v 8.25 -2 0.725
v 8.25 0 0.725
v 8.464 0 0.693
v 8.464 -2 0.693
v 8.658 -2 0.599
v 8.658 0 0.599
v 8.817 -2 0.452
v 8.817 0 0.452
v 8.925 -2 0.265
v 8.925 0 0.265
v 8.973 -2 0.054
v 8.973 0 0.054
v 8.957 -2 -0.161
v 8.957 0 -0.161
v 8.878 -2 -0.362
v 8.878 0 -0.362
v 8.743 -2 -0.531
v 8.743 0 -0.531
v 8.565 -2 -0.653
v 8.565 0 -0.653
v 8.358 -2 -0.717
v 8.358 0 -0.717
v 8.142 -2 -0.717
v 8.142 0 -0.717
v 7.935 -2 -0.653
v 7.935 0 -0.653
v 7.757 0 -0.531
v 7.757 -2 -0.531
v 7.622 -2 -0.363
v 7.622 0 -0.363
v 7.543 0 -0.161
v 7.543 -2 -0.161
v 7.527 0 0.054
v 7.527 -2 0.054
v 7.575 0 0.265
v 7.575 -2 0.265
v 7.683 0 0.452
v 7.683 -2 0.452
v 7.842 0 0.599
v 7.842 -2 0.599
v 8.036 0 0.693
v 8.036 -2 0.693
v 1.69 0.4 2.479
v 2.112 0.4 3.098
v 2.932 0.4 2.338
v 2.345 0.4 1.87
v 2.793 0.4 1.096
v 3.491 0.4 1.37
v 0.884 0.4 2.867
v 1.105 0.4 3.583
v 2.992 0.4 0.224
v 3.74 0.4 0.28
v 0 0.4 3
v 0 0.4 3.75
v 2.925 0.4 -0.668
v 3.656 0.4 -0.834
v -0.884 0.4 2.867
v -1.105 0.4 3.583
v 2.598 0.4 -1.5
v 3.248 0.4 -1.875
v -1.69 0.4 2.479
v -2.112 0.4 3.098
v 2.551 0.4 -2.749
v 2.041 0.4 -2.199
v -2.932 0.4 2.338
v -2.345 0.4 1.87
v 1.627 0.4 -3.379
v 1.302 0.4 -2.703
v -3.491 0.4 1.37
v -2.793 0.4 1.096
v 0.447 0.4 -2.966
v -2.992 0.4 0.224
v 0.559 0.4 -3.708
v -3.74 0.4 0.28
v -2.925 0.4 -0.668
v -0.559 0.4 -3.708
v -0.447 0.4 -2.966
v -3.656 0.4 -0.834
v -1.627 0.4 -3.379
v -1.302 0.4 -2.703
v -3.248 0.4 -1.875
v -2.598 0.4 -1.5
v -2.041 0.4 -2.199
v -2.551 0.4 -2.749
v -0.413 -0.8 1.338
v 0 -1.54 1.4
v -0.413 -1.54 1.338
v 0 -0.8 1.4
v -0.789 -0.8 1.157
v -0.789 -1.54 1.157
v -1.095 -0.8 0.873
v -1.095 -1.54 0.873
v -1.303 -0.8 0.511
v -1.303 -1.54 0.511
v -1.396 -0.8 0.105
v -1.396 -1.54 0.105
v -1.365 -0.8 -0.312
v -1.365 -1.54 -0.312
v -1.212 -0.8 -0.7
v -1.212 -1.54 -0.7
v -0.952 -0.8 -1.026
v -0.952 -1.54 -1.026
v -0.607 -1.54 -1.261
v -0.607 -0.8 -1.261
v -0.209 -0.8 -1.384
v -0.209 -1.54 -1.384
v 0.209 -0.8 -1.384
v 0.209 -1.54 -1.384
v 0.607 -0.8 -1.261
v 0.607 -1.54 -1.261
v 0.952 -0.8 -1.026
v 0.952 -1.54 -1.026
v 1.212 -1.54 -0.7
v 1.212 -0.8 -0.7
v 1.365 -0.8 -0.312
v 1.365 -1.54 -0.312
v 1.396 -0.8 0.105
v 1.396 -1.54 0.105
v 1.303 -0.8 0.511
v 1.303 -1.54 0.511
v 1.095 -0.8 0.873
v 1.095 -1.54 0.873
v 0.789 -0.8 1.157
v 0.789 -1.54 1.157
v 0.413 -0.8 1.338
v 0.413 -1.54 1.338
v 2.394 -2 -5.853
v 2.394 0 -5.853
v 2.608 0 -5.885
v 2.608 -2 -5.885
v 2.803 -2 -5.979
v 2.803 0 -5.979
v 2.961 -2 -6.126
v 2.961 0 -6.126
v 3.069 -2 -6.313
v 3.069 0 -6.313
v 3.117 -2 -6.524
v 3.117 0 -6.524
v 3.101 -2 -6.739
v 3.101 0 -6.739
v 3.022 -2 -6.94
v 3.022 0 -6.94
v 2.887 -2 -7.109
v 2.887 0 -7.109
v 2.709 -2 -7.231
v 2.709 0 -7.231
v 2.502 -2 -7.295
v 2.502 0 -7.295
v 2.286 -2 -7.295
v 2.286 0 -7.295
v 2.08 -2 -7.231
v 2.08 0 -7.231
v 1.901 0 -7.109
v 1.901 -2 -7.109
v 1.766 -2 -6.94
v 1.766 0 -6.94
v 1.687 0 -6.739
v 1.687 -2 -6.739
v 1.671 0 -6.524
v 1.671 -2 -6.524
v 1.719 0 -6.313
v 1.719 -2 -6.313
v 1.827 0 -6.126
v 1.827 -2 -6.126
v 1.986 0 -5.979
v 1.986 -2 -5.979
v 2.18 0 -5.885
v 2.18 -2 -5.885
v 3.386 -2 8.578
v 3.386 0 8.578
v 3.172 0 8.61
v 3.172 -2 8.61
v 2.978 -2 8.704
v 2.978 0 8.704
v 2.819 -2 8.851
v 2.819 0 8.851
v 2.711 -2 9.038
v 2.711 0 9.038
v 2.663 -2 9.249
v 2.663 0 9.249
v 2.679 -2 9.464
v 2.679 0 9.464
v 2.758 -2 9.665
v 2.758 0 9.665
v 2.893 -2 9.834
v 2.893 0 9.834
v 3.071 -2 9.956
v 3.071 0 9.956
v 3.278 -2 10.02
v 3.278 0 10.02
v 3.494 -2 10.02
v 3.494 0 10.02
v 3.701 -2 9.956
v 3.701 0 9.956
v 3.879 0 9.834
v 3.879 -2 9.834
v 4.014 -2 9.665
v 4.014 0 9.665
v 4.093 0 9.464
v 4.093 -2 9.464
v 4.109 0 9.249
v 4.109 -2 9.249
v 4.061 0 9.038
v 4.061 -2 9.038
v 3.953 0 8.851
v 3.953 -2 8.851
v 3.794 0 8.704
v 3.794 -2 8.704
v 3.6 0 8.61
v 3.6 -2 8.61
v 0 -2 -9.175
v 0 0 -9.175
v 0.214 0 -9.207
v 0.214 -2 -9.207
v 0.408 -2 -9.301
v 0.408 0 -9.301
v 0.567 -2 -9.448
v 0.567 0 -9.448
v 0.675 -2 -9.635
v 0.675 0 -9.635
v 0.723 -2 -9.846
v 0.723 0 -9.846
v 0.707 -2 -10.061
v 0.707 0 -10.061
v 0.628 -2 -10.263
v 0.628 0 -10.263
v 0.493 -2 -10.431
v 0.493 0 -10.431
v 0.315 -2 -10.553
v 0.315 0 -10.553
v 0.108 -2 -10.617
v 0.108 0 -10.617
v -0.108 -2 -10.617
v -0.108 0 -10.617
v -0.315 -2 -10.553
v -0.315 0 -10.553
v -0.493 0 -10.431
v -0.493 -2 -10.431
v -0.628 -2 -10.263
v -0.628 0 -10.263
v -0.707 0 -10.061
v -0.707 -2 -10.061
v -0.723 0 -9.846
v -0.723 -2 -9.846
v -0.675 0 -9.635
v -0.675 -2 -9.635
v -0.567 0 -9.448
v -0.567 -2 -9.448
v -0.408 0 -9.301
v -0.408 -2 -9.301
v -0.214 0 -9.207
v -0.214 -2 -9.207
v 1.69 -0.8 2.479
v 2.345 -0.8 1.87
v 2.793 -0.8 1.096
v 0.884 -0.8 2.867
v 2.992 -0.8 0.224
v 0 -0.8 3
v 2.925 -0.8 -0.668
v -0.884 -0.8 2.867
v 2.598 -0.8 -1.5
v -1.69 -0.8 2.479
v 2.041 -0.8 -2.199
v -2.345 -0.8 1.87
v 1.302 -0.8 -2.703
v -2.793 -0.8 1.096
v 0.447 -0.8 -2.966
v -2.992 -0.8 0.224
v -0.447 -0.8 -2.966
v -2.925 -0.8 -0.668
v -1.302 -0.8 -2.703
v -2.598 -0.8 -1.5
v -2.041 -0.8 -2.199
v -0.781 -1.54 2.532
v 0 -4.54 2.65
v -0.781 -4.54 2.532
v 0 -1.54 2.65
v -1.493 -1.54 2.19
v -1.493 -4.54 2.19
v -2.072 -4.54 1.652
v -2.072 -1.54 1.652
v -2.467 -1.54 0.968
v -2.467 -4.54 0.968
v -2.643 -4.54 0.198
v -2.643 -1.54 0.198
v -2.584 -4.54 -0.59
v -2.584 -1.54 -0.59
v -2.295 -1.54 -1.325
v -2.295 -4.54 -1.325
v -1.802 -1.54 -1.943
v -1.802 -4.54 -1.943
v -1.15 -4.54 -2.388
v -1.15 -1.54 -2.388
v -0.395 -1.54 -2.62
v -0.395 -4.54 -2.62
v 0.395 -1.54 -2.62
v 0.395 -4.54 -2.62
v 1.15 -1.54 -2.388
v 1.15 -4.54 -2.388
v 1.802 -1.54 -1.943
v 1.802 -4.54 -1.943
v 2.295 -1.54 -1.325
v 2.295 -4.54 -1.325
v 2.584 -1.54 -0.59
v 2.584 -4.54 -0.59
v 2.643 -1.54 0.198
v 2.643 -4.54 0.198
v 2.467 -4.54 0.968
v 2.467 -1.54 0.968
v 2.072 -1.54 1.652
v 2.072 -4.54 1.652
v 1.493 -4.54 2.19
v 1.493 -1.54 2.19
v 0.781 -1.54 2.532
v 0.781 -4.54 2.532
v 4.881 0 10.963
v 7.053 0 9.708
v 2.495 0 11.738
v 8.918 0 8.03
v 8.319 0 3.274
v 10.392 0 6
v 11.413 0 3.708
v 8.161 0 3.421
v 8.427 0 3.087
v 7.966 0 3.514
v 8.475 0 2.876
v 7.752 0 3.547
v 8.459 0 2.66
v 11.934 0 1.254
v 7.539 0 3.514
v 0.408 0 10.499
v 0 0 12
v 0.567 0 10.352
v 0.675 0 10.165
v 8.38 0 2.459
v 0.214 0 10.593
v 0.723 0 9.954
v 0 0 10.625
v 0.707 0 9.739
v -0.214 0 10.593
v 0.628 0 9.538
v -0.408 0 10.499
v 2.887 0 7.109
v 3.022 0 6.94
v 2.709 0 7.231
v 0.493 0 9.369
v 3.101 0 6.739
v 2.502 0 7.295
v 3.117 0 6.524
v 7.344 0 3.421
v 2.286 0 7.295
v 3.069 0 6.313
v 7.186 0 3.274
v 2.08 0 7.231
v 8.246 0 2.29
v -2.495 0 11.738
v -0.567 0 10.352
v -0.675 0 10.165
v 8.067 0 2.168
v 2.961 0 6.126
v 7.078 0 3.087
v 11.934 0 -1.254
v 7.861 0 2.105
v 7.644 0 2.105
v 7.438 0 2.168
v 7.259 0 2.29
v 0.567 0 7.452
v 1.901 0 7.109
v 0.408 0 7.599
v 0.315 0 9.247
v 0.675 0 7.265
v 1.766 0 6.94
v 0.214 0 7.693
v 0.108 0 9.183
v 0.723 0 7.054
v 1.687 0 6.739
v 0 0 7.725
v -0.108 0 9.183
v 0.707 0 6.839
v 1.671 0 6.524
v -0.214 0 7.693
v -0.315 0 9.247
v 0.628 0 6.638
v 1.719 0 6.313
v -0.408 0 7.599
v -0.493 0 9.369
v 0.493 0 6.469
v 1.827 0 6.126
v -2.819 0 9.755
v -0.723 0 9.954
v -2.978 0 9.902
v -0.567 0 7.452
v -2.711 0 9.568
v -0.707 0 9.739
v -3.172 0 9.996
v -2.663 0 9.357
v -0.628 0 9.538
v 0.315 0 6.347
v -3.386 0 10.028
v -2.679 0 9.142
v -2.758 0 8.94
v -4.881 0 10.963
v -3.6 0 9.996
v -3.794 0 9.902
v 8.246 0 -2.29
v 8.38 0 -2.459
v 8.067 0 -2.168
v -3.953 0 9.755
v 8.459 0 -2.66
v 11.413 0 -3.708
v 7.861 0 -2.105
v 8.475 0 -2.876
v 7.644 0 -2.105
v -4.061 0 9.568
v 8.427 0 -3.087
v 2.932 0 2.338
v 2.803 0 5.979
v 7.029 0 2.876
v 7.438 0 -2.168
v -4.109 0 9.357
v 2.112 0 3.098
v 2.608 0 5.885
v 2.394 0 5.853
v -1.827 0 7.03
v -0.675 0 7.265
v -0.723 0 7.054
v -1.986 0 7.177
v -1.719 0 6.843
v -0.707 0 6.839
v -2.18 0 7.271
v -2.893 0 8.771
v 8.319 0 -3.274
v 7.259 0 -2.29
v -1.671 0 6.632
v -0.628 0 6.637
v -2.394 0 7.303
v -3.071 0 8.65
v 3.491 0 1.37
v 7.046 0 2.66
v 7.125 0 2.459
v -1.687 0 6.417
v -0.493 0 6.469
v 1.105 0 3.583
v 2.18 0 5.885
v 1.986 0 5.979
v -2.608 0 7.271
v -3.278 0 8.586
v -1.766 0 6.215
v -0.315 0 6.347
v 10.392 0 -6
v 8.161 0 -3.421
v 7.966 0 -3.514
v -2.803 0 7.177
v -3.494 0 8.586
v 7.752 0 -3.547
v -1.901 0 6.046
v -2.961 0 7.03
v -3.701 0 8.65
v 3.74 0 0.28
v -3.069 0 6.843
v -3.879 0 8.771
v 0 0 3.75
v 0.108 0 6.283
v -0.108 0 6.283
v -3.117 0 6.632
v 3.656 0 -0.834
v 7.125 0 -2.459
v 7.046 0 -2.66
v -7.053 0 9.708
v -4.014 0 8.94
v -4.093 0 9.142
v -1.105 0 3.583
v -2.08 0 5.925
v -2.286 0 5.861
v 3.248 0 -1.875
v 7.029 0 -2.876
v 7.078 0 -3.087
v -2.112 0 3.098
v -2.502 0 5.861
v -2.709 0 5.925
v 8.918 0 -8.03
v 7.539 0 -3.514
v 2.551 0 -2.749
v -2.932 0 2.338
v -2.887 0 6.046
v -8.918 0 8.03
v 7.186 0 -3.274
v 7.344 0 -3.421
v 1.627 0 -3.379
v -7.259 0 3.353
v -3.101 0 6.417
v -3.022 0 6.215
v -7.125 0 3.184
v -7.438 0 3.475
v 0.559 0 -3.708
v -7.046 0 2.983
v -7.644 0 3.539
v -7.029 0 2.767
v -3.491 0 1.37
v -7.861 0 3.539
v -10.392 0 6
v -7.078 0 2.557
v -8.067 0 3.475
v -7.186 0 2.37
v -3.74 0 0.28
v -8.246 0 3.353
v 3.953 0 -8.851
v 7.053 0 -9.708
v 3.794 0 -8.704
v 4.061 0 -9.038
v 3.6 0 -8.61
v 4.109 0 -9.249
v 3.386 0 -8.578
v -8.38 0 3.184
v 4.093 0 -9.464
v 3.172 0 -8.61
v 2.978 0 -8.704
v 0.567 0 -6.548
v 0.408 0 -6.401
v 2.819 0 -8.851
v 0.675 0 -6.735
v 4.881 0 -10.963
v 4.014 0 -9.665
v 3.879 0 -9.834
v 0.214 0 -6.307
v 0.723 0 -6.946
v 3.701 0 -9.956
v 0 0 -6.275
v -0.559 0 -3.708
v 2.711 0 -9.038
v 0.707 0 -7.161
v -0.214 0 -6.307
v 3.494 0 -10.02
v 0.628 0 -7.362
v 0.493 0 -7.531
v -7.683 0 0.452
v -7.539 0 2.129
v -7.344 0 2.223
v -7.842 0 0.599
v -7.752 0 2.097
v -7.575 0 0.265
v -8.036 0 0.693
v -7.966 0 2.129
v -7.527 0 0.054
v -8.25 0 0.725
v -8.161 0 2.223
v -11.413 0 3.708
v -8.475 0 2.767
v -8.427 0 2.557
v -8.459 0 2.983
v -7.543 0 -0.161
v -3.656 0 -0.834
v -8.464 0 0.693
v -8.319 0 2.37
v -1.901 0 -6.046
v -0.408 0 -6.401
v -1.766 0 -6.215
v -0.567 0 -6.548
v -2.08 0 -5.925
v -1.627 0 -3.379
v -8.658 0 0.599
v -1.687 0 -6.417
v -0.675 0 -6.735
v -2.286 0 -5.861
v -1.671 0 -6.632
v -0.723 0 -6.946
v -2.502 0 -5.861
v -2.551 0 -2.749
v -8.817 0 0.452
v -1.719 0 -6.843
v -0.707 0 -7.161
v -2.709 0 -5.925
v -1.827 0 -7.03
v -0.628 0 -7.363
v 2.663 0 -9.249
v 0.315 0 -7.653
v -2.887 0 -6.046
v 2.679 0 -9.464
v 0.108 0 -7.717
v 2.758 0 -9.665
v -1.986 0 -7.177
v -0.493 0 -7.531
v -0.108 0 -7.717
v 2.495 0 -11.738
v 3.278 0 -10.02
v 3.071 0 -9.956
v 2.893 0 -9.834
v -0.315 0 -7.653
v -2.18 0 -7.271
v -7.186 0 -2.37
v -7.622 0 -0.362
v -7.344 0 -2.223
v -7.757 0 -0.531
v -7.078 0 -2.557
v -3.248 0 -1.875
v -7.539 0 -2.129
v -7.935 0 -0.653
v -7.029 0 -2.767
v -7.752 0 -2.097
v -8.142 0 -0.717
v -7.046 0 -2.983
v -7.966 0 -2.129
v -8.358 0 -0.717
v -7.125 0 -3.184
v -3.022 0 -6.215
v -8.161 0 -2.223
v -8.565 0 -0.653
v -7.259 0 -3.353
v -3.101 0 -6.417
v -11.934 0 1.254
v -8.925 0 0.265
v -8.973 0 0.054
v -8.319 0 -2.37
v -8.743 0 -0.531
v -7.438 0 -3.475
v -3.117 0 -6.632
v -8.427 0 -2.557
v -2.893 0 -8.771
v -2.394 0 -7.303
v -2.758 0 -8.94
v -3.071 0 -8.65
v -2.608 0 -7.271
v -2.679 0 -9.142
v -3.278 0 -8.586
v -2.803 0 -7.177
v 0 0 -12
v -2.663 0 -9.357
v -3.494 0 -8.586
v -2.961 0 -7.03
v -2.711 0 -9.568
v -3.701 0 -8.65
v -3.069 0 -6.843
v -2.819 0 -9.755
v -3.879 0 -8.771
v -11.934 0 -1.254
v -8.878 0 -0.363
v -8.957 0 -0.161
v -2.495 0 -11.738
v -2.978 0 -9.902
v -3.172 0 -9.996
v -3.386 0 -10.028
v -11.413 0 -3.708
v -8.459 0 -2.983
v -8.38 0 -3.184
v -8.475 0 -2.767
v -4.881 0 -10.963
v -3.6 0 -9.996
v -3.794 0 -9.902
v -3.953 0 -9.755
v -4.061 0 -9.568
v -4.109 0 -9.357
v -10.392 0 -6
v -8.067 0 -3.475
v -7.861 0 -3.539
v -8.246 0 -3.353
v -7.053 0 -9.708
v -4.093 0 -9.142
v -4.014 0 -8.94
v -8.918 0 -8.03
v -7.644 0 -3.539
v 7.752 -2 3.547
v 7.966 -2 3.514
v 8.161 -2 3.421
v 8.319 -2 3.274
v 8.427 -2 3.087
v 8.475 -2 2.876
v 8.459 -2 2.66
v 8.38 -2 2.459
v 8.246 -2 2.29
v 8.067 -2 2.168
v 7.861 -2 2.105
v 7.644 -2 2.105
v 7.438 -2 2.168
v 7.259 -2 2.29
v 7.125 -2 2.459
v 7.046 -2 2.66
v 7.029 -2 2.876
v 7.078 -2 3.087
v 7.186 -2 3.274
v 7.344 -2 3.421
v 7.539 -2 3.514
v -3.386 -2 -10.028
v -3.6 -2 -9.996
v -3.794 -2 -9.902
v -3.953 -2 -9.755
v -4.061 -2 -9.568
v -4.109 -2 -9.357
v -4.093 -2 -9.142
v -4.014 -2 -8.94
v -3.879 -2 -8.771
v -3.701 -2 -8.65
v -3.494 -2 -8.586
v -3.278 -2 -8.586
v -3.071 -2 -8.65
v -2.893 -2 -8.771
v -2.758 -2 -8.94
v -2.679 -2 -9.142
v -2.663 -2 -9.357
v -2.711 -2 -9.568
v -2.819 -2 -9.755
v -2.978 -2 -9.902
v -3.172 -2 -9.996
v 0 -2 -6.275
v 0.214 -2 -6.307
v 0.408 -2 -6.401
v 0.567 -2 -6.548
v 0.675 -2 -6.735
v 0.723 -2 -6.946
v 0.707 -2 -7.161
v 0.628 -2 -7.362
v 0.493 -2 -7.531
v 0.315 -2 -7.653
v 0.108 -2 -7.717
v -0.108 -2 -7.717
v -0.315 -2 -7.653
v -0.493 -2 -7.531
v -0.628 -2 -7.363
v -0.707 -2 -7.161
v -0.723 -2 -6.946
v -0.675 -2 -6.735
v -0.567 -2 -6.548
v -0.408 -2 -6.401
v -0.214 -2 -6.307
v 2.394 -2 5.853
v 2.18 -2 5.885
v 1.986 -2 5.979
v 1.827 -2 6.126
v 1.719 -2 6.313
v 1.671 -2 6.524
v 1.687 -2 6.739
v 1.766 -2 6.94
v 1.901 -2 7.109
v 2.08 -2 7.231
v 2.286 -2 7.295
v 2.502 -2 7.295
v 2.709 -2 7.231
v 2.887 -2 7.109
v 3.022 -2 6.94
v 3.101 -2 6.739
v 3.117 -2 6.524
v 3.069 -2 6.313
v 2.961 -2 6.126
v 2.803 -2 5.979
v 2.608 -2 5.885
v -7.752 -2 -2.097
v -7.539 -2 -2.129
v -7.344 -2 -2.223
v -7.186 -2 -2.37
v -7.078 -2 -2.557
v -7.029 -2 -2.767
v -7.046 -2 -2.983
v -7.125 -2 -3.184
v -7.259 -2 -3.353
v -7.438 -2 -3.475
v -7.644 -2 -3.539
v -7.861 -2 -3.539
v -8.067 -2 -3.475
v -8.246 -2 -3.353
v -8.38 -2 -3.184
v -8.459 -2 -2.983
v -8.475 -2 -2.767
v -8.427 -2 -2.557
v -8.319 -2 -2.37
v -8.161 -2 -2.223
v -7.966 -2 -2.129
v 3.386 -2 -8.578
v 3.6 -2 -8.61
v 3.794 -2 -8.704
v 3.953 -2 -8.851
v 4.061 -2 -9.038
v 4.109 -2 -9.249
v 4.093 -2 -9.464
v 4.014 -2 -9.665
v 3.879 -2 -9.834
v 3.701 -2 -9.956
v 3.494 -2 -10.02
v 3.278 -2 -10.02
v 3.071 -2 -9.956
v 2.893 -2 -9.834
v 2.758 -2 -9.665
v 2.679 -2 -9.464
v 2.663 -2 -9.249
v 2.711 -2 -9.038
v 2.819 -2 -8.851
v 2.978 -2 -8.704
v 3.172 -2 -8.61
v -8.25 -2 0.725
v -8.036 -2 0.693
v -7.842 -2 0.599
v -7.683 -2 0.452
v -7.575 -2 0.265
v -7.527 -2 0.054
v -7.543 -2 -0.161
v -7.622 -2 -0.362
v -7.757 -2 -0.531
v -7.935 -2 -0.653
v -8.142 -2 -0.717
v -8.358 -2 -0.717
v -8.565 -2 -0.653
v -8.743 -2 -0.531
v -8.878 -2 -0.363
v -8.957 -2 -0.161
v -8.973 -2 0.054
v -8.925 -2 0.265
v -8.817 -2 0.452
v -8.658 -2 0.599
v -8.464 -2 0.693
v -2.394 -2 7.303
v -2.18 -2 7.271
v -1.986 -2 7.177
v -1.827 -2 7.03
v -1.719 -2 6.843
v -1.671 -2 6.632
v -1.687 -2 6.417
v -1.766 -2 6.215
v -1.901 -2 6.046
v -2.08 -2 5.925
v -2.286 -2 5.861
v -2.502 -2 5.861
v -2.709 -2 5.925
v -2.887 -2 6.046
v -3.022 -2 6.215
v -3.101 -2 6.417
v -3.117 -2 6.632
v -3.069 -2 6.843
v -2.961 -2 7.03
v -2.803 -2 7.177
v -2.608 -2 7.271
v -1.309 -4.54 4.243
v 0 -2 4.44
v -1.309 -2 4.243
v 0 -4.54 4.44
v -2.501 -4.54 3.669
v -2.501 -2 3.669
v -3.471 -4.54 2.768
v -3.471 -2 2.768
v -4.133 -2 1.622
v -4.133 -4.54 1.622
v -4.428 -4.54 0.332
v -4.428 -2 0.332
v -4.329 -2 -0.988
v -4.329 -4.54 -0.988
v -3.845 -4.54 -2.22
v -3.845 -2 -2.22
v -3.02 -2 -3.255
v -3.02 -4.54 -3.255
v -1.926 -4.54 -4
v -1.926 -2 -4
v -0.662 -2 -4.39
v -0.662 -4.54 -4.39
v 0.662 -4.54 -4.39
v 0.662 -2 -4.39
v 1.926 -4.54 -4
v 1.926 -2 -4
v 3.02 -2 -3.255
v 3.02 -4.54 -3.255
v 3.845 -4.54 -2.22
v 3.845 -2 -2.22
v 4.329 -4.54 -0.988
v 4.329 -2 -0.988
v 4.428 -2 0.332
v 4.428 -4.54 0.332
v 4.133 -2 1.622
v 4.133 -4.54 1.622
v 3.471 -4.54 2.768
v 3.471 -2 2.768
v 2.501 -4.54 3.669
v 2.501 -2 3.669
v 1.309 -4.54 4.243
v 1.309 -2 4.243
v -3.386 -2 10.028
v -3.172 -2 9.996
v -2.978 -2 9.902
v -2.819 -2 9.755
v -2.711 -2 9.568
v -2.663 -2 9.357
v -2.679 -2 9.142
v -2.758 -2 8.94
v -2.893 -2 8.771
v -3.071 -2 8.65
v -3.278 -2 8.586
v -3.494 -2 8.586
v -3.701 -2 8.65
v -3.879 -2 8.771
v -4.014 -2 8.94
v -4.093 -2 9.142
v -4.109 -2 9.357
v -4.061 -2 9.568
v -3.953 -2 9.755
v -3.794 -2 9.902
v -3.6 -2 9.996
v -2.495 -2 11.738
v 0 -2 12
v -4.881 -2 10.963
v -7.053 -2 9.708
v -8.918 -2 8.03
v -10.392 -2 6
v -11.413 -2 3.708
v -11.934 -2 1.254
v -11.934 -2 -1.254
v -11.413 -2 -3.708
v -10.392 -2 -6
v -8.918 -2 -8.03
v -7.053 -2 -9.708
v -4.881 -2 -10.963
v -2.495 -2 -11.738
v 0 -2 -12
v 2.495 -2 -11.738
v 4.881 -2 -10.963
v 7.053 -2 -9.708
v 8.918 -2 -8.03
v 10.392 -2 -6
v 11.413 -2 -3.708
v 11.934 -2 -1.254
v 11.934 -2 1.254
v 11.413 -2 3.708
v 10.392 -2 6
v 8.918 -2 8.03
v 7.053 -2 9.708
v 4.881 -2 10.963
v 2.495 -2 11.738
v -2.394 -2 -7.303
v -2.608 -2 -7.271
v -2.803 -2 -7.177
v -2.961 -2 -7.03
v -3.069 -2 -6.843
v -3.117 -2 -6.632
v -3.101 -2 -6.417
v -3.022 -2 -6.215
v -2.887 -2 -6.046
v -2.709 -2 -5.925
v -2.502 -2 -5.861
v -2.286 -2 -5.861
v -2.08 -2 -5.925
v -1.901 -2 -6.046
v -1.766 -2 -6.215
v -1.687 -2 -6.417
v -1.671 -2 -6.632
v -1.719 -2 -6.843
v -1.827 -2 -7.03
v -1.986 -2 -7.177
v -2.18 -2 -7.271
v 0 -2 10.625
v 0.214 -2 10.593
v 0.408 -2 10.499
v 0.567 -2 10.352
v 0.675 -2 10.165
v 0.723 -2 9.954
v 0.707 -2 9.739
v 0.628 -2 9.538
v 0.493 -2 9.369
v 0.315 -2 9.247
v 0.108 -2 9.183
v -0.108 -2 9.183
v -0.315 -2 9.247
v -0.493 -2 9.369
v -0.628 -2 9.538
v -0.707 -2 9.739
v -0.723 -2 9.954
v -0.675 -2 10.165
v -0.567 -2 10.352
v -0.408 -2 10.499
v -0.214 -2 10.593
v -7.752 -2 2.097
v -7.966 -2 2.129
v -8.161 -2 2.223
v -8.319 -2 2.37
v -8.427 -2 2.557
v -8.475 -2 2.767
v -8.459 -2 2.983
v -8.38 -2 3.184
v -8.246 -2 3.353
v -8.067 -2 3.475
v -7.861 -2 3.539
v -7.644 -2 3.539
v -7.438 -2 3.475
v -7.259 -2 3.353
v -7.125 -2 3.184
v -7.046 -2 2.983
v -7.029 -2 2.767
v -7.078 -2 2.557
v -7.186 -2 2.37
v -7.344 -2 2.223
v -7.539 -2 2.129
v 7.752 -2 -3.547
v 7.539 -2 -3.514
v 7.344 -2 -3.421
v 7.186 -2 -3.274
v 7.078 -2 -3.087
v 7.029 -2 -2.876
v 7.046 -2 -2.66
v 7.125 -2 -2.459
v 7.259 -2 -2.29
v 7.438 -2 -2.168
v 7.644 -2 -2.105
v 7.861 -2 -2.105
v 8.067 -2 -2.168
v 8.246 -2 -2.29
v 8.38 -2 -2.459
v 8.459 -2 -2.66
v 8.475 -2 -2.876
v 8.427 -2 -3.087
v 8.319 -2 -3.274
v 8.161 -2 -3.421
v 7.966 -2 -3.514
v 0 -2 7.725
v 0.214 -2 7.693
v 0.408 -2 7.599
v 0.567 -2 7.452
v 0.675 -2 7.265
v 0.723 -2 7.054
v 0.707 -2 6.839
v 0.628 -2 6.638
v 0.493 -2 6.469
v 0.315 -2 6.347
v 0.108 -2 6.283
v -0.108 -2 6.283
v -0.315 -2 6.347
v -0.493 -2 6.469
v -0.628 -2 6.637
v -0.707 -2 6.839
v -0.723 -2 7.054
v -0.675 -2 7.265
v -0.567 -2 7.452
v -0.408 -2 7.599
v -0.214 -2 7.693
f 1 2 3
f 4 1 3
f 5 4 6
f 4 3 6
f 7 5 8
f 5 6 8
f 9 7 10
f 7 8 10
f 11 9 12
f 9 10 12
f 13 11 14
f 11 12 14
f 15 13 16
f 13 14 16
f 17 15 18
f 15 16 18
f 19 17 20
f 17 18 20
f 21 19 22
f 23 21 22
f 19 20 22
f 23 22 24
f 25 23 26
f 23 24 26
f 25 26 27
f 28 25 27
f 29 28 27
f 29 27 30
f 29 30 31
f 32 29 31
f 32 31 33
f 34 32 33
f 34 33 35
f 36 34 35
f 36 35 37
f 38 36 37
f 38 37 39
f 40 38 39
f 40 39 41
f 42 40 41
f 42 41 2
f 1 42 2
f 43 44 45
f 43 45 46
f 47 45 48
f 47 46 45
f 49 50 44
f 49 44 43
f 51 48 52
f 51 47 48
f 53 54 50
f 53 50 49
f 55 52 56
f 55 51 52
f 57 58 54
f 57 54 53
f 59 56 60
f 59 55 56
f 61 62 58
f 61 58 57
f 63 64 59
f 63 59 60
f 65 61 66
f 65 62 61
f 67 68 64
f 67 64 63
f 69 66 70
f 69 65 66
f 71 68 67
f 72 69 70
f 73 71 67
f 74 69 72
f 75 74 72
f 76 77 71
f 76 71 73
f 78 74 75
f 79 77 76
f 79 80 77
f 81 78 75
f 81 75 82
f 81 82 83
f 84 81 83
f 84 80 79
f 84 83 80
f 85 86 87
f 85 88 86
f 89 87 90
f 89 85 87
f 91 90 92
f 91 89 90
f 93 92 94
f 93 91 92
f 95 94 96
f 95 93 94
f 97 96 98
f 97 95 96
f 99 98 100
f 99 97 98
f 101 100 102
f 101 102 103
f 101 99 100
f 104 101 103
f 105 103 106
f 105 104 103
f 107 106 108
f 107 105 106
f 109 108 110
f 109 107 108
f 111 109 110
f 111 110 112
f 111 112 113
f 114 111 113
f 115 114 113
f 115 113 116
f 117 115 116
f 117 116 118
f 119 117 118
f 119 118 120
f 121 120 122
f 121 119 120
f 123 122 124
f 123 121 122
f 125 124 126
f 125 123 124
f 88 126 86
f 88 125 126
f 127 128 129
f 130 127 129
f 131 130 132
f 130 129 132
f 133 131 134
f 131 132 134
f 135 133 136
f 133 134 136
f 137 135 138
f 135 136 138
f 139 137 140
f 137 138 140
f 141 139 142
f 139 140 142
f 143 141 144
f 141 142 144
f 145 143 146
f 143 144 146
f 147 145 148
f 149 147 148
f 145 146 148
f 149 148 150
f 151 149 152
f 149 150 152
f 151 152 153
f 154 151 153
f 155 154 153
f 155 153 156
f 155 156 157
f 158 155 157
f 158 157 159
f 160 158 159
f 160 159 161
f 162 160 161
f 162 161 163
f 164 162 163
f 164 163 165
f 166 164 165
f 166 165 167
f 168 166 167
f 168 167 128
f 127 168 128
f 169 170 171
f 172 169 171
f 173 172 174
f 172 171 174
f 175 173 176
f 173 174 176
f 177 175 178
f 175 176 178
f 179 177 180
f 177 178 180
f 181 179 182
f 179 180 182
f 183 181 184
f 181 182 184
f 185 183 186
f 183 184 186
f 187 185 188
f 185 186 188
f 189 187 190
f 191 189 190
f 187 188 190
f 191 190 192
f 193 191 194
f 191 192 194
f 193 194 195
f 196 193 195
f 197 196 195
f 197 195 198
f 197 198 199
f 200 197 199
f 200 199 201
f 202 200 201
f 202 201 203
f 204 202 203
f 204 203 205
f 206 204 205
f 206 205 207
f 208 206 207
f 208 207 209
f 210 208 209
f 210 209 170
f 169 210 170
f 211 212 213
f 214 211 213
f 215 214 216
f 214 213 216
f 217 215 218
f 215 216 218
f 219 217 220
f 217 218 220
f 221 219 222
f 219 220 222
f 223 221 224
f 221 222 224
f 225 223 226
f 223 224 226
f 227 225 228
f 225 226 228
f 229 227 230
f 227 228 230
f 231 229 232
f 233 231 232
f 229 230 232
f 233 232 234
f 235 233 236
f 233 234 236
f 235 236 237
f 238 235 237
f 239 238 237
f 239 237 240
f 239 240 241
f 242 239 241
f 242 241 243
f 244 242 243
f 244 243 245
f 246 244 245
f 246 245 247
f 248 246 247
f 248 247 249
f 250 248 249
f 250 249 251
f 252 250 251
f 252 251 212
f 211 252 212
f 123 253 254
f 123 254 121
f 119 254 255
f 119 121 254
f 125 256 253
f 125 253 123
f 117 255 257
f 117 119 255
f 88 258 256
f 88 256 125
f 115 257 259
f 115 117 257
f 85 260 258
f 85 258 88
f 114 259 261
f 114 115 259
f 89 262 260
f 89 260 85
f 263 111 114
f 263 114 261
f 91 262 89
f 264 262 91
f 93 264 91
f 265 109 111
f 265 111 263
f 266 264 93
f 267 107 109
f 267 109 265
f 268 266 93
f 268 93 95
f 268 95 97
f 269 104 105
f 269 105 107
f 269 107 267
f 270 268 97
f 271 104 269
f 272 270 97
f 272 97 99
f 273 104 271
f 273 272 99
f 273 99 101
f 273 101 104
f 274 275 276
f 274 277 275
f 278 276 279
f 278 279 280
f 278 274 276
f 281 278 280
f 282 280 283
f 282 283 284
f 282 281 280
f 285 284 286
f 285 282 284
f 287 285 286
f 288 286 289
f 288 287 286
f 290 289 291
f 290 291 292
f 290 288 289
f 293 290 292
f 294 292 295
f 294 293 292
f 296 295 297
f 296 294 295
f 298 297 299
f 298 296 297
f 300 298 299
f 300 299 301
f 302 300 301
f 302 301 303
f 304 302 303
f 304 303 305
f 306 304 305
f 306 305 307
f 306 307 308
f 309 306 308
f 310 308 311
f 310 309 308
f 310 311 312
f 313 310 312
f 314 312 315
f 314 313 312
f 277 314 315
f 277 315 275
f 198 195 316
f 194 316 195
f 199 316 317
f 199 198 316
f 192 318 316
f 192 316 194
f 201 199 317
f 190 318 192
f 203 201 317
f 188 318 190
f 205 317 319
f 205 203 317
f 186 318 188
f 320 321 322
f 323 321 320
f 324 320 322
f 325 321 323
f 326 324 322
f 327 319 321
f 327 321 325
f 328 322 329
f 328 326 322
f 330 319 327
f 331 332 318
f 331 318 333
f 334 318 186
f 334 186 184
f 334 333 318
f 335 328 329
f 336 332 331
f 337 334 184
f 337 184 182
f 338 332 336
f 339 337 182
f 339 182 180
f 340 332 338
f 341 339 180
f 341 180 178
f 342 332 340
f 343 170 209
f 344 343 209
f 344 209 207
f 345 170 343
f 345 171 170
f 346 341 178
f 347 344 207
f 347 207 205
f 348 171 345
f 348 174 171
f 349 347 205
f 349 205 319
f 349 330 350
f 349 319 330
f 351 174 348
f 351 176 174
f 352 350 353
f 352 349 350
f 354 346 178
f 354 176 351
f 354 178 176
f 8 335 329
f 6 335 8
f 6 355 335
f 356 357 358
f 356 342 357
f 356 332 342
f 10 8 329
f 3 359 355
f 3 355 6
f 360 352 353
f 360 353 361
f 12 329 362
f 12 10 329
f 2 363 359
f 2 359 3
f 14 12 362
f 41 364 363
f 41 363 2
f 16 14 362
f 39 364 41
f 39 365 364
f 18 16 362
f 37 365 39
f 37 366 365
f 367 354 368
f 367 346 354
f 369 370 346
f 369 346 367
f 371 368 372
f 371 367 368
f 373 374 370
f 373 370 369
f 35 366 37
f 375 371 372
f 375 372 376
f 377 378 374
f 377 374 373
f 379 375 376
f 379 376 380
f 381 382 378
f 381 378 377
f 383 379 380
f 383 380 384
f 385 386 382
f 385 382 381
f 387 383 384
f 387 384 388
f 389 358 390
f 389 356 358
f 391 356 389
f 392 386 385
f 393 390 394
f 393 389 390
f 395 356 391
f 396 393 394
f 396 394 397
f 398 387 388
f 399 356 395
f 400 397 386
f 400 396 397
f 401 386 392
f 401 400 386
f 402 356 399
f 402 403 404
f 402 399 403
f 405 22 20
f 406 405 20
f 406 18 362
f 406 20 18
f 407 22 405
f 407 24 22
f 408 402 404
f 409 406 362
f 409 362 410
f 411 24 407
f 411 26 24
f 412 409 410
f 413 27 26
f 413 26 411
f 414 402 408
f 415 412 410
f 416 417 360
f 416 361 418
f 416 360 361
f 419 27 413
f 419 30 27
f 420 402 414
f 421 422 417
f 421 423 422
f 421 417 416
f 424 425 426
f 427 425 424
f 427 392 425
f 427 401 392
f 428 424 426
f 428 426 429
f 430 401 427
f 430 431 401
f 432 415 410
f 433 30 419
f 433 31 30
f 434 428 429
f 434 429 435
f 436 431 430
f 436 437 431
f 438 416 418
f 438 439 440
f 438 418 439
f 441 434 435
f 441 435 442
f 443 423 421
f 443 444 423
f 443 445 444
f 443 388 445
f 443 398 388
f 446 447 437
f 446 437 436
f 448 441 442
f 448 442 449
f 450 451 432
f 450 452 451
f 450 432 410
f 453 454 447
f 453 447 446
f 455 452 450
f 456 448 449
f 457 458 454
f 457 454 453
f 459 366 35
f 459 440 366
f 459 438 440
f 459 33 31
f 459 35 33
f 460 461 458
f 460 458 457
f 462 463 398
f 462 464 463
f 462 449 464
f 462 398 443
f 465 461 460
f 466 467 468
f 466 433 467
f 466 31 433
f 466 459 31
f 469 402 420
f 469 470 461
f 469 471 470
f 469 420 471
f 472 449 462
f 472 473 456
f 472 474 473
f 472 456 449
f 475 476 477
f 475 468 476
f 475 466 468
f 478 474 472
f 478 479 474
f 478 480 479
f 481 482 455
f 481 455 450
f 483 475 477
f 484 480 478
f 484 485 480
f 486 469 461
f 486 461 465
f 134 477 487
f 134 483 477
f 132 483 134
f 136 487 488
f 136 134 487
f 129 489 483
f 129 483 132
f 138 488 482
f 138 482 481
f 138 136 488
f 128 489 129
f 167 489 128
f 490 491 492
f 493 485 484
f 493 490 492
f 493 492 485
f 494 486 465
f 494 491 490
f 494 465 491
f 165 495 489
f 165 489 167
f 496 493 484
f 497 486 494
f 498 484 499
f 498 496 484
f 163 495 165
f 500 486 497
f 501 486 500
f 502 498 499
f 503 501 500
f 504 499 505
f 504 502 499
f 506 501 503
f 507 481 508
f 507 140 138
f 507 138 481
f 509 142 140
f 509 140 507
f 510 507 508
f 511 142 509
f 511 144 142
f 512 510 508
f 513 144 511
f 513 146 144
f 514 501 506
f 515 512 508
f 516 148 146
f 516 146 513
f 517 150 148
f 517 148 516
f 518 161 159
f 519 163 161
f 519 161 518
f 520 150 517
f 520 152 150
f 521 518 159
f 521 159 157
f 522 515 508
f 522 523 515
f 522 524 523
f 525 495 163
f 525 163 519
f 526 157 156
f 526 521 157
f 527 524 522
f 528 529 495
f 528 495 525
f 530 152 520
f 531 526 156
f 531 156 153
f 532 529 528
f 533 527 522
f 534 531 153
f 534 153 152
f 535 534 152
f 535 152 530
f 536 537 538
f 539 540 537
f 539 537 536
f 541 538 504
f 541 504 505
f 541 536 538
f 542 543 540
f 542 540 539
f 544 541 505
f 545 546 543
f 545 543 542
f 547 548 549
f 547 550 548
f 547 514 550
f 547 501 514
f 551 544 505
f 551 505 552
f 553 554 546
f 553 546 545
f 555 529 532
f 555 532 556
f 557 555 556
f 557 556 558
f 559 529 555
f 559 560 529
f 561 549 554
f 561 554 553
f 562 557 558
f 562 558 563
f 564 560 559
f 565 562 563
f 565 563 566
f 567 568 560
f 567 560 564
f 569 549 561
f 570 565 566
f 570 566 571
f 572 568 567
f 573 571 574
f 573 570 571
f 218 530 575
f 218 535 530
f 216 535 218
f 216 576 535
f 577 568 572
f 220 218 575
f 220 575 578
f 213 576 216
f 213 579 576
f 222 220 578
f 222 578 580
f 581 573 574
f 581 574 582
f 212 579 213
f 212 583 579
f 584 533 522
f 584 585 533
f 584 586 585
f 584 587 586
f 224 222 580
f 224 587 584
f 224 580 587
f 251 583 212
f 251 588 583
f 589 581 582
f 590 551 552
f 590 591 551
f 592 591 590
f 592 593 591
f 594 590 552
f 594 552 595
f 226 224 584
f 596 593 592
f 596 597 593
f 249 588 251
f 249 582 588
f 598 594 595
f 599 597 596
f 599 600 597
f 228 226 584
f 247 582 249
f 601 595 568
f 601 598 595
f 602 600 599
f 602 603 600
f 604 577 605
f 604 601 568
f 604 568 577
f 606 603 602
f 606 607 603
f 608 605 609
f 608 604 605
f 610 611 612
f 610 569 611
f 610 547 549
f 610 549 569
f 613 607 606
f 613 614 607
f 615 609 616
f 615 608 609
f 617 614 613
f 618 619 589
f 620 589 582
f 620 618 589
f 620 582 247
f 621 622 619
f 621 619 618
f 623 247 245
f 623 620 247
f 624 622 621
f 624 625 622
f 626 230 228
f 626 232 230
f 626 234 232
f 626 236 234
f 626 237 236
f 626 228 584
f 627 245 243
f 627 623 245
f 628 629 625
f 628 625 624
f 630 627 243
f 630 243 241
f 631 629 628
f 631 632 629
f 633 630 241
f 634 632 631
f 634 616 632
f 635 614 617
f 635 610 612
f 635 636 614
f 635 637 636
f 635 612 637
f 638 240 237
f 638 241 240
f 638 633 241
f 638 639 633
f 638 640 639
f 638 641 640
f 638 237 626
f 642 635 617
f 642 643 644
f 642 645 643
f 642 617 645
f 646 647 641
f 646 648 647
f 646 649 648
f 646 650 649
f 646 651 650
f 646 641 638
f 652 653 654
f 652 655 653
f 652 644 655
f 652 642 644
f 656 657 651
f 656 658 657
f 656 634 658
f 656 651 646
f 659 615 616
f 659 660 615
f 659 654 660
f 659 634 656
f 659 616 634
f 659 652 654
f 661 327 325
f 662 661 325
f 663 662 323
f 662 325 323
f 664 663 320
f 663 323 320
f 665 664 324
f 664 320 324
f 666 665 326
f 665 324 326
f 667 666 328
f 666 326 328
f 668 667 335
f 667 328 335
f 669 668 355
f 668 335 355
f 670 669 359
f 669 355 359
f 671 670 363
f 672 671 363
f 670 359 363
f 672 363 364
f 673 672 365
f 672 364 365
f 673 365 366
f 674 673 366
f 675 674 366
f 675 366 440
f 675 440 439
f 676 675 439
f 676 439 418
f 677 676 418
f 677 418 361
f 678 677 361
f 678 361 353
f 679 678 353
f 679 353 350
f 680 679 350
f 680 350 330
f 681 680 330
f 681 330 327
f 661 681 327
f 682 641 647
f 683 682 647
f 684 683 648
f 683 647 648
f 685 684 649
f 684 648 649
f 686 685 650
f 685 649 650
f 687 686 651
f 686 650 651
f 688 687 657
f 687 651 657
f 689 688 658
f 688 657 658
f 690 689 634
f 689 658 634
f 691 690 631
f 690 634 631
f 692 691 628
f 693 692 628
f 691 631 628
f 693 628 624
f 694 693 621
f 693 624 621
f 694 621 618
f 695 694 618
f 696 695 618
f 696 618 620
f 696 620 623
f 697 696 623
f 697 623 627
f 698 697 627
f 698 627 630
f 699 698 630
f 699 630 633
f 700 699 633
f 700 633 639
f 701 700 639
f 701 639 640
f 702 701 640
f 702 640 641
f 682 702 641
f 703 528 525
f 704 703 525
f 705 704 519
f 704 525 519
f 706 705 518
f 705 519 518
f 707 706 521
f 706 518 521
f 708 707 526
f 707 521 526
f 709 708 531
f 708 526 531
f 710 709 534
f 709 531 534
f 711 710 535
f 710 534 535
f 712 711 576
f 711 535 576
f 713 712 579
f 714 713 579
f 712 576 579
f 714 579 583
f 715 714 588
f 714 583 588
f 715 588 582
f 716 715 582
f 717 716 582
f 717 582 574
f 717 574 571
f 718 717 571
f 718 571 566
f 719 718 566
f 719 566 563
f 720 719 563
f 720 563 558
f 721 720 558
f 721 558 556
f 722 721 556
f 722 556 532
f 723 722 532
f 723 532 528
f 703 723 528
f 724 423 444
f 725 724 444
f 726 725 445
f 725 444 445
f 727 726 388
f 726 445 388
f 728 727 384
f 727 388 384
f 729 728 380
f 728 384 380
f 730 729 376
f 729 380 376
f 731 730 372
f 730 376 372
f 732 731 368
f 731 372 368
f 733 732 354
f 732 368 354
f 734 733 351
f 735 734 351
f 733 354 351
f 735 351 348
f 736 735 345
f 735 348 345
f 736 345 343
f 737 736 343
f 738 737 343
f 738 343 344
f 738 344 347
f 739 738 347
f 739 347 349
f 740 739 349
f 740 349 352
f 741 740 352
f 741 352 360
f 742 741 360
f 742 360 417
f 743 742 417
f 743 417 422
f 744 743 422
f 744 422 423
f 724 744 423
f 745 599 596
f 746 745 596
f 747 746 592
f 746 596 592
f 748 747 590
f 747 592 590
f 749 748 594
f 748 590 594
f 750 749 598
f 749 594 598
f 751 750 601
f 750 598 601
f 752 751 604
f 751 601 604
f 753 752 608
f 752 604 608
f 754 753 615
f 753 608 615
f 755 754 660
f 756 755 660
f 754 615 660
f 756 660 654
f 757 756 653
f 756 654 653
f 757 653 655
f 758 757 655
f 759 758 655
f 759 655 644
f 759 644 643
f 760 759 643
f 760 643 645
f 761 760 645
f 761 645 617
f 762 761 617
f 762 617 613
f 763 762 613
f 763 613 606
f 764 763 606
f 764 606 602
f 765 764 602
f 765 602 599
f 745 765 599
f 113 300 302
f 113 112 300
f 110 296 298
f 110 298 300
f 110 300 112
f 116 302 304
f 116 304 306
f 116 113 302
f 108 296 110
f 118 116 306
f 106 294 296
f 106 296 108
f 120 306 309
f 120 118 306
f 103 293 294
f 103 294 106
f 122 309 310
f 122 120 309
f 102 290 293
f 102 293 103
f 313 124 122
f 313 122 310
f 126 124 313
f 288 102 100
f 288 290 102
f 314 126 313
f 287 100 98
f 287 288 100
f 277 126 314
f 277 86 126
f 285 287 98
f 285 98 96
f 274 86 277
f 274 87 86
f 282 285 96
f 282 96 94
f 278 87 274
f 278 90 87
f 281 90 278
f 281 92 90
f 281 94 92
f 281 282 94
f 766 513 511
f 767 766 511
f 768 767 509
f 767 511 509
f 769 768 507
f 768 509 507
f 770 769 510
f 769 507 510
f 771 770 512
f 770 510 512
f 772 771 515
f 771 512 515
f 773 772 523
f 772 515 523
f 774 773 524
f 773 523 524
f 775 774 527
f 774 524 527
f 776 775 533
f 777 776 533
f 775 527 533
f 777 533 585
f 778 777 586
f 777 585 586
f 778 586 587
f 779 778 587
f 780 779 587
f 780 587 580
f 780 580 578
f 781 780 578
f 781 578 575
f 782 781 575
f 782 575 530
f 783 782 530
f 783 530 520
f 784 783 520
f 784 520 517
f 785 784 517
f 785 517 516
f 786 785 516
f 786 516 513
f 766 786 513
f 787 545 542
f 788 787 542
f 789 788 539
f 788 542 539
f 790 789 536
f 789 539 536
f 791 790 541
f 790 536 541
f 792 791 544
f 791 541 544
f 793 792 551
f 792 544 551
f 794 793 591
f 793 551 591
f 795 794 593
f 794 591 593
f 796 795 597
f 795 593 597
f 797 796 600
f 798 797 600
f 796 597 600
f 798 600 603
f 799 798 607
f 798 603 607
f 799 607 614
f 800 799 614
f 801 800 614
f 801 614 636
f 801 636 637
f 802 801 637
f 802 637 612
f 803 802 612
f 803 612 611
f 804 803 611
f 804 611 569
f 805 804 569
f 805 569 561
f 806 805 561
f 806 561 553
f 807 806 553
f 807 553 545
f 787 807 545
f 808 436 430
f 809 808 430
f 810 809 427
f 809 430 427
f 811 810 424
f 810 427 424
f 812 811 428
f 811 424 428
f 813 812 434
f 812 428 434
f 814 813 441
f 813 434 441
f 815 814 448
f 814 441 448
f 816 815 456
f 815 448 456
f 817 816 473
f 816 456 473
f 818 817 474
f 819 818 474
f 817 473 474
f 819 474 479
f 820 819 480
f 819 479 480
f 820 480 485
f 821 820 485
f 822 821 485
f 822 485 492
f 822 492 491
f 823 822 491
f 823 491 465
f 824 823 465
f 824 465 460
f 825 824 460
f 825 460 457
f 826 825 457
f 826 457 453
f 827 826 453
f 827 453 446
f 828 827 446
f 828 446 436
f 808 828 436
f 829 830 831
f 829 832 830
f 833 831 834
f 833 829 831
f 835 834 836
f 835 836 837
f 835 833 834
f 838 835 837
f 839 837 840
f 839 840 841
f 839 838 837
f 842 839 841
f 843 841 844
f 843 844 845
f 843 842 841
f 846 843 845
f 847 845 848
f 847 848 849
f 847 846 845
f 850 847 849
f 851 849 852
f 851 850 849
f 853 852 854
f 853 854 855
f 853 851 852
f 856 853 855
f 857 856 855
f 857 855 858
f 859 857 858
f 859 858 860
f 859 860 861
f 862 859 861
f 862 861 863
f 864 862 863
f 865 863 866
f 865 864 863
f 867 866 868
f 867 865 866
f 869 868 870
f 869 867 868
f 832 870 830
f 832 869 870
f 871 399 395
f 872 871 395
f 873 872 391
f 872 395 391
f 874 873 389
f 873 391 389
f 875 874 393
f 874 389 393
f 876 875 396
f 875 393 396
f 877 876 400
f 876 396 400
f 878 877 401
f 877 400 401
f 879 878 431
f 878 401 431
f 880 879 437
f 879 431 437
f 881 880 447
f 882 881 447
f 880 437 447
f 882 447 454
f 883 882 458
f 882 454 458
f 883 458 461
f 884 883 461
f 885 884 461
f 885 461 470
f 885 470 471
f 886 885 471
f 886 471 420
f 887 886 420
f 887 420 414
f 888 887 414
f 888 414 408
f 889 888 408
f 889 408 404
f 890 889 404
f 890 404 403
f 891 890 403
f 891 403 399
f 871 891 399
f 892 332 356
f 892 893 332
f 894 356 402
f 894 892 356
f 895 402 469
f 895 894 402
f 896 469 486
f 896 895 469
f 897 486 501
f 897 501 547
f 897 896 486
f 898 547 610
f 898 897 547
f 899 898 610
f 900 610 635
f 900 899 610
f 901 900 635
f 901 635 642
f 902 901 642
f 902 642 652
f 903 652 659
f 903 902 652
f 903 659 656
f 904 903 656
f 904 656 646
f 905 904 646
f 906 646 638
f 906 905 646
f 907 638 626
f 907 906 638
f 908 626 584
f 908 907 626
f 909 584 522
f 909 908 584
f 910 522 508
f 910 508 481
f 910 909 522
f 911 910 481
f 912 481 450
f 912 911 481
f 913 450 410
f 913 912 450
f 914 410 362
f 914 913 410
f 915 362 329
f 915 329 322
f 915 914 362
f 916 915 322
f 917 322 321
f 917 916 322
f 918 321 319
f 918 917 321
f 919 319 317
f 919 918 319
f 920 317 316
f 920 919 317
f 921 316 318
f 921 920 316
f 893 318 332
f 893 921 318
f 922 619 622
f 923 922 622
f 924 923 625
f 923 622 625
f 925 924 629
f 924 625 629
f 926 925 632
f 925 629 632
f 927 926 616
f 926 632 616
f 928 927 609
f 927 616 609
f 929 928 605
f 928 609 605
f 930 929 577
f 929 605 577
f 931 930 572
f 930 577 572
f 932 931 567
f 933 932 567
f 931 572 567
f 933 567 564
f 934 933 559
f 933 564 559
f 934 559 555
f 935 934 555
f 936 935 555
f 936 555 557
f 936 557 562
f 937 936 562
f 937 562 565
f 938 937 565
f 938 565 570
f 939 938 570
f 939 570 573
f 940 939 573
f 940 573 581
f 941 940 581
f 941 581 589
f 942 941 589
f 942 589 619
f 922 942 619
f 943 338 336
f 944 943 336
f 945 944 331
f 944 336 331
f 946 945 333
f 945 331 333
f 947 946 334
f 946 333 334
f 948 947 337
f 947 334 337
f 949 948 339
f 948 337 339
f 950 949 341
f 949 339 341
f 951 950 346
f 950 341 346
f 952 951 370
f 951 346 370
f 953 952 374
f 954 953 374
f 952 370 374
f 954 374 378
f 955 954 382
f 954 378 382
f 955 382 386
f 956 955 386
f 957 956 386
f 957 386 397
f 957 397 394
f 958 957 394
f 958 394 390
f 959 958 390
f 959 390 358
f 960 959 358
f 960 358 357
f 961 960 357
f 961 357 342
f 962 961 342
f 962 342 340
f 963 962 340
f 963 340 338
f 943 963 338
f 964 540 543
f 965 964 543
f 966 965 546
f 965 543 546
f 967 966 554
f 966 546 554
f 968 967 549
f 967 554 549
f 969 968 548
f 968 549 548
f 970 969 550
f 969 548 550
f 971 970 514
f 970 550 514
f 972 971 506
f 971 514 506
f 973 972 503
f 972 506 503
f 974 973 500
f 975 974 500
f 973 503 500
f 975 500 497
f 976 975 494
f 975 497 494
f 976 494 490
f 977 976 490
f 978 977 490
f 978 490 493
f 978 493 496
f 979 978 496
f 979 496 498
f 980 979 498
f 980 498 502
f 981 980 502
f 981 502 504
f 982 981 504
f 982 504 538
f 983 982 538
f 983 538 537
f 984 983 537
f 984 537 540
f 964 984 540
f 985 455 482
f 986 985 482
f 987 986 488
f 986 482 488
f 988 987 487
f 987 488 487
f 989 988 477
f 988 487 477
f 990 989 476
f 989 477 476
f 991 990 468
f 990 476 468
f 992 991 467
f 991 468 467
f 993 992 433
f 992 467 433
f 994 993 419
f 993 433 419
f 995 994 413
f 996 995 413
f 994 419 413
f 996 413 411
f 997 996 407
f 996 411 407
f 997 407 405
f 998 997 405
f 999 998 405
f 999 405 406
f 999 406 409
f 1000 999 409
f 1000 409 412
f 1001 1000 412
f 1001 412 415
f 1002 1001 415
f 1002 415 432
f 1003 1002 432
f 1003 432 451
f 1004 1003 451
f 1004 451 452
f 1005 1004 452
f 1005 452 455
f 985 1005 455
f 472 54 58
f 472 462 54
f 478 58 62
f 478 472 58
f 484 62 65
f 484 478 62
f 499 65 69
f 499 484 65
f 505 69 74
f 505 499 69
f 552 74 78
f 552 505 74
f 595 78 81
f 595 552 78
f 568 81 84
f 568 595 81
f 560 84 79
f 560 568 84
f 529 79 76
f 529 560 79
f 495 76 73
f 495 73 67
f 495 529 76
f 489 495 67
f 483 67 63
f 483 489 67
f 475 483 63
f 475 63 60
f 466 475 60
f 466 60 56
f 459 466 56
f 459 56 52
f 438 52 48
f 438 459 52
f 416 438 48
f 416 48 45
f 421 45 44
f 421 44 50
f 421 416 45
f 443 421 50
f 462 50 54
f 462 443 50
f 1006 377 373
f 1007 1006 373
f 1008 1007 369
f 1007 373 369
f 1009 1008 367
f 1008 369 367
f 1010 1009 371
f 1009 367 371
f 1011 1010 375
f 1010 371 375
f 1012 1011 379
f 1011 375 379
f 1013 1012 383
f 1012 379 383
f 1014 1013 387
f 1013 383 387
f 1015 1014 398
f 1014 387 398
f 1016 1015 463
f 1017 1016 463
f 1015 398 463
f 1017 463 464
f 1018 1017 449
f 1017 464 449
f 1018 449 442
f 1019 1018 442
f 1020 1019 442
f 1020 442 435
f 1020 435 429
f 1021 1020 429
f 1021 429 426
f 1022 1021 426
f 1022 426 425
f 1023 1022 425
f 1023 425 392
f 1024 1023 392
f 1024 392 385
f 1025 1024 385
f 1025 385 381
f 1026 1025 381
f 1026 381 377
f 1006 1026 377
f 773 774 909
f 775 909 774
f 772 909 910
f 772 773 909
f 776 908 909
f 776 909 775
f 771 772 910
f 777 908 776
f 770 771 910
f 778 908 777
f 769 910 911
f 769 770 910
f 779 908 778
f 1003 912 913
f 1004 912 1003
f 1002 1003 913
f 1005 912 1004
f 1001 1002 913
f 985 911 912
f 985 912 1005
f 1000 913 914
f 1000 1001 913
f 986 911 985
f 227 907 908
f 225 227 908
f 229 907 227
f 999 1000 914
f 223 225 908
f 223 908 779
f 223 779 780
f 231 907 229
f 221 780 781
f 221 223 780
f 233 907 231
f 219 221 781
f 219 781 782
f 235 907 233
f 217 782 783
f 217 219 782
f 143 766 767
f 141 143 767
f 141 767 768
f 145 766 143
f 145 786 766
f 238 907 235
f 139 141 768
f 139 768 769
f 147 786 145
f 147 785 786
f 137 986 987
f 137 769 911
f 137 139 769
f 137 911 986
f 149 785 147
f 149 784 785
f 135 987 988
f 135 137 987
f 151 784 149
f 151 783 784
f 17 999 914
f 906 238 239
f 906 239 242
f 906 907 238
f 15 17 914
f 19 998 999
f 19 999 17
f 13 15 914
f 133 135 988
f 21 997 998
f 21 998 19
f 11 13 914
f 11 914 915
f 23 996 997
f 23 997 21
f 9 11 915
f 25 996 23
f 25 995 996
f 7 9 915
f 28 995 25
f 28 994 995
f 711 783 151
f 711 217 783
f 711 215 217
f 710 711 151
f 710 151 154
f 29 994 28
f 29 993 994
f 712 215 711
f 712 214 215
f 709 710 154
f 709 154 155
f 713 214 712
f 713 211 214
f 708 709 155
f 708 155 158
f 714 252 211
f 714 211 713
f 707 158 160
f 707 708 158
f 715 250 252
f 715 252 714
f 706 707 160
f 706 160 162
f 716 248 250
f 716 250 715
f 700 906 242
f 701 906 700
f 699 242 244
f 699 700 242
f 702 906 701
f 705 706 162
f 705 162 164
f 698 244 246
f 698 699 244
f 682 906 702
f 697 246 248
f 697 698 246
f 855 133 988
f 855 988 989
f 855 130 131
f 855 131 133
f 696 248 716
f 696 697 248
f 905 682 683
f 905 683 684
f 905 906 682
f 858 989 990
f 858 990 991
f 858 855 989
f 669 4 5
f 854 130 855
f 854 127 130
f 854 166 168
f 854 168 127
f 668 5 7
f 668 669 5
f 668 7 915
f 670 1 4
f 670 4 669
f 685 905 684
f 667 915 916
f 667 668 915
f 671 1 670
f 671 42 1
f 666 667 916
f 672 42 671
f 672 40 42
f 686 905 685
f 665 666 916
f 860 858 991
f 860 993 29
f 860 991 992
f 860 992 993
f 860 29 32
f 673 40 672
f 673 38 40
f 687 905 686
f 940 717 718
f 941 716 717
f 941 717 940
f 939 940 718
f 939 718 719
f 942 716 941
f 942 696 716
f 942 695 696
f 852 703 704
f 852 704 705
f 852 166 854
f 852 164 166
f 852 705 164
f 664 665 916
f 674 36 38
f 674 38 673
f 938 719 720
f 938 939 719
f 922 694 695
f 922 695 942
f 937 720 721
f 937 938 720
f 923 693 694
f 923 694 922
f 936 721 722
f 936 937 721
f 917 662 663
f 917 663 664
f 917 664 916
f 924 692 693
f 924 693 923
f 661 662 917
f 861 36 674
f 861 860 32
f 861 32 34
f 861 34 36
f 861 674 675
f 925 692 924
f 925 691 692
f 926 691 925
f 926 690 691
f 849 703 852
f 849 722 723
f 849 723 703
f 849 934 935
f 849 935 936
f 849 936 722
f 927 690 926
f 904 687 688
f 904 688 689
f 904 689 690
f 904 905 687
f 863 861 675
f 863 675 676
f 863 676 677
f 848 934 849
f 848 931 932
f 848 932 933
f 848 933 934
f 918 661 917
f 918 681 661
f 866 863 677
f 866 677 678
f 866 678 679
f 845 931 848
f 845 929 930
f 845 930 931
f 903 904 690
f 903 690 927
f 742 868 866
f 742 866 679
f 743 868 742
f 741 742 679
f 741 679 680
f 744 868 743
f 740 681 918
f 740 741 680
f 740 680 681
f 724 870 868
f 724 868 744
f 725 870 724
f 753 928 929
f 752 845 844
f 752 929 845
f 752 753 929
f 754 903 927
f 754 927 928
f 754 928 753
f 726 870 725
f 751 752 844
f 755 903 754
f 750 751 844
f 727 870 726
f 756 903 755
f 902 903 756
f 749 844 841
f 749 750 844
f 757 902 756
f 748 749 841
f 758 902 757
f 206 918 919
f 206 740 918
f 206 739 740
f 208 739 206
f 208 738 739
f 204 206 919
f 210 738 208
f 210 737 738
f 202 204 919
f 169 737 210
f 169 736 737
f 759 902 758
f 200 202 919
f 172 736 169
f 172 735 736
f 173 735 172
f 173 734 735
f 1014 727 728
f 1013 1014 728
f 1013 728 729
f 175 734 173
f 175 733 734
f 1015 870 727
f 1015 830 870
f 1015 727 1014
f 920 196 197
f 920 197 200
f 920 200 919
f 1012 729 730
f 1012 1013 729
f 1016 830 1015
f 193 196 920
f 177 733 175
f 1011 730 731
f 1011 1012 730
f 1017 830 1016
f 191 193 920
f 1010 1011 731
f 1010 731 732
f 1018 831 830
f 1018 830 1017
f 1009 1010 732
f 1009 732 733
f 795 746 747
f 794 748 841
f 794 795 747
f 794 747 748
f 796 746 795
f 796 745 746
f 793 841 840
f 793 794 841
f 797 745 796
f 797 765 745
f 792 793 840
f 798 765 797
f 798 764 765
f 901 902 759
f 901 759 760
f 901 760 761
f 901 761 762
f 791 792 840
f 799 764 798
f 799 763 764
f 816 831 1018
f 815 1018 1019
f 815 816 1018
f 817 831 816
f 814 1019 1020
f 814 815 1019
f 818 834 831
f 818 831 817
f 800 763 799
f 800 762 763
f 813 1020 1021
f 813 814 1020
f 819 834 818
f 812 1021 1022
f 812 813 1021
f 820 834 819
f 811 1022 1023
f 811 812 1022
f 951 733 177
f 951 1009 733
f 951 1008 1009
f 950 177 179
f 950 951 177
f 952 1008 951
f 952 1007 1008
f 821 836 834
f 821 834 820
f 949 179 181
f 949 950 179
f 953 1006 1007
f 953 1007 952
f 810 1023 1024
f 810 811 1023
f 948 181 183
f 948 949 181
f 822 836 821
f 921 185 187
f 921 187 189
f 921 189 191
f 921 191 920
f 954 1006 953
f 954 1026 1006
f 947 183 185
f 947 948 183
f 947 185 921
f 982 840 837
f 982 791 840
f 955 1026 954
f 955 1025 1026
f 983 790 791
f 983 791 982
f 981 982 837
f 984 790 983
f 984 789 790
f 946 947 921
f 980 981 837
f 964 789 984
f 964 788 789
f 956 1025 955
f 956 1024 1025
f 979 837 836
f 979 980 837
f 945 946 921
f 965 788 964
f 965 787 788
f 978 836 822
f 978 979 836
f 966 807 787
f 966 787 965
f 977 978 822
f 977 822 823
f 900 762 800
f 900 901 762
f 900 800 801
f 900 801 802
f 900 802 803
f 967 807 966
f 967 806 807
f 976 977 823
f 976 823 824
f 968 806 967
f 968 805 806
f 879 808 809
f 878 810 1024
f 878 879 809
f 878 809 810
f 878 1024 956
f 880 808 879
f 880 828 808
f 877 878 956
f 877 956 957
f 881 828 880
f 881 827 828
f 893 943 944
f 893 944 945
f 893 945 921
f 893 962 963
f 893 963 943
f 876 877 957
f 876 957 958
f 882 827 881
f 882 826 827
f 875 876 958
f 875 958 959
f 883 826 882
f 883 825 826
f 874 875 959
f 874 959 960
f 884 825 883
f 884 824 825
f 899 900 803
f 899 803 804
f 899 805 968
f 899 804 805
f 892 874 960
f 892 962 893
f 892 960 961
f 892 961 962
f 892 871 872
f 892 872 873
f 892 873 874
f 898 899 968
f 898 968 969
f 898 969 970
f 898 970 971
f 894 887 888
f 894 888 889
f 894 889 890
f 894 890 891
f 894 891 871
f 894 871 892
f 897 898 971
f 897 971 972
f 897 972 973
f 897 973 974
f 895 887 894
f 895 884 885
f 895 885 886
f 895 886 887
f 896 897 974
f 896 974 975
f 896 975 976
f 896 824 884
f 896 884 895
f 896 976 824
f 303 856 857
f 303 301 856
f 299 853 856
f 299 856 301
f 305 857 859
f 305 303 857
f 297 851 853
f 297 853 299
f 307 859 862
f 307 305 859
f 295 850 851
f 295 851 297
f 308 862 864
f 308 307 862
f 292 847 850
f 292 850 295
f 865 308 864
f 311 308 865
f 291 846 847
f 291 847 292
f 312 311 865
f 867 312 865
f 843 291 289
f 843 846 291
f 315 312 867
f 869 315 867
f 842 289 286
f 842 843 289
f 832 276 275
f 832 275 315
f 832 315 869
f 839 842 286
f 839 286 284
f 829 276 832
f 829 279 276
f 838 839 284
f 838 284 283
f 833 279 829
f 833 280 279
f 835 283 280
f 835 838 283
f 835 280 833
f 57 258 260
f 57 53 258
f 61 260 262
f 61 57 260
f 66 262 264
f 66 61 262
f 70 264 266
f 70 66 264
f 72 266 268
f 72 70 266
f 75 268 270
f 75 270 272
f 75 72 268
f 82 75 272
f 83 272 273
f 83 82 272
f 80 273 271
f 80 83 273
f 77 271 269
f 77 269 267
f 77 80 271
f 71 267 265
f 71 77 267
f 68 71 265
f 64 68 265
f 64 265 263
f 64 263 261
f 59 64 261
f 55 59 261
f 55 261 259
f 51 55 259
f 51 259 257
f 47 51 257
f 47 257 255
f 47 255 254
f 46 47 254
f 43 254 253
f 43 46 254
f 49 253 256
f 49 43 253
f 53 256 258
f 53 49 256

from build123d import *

# Parameters (mm, degrees)
SKETCH2_R          = 0.725
CUT_EXTRUDE1_DEPTH = 18.567344705


with BuildPart() as part:
    # Sketch1 → Revolve1 (revolve)
    with BuildSketch(Plane.XY, mode=Mode.PRIVATE) as revolve1_sk:
        Polygon((-3.75, 0), (-12, 0), (-12, -2), (-4.44, -2), (-4.44, -4.54), (-2.65, -4.54), (-2.65, -1.54), (-1.4, -1.54), (-1.4, -0.8), (-3, -0.8), (-3, 0.4), (-3.75, 0.4), align=None)
    revolve(revolve1_sk.sketch.rotate(Axis((0, 0, 0), (0, -1, 0)), 270), axis=Axis((0, 0, 0), (0, -1, 0)))

    # Sketch2 → Cut-Extrude1 (cut, through all)
    with BuildSketch(Plane(origin=(0, 0, 0), x_dir=(1, 0, 0), z_dir=(0, 1, 0))):
        with Locations(Location((-8.25, 0, 0), (0, 0, 270))):
            Circle(SKETCH2_R)
        with Locations(Location((-7.752464121, 2.821666182, 0), (0, 0, 270))):
            Circle(SKETCH2_R)
        with Locations(Location((0, 7, 0), (0, 0, 270))):
            Circle(SKETCH2_R)
        with Locations(Location((0, 9.9, 0), (0, 0, 270))):
            Circle(SKETCH2_R)
        with Locations(Location((2.394141003, 6.577848346, 0), (0, 0, 270))):
            Circle(SKETCH2_R)
        with Locations(Location((3.385999419, 9.302956946, 0), (0, 0, 270))):
            Circle(SKETCH2_R)
        with Locations(Location((-2.394141003, 6.577848346, 0), (0, 0, 90))):
            Circle(SKETCH2_R)
        with Locations(Location((-3.385999419, 9.302956946, 0), (0, 0, 90))):
            Circle(SKETCH2_R)
        with Locations(Location((-7.752464121, -2.821666182, 0), (0, 0, 90))):
            Circle(SKETCH2_R)
        with Locations(Location((7.752464121, -2.821666182, 0), (0, 0, 270))):
            Circle(SKETCH2_R)
        with Locations(Location((7.752464121, 2.821666182, 0), (0, 0, 90))):
            Circle(SKETCH2_R)
        with Locations(Location((8.25, 0, 0), (0, 0, 270))):
            Circle(SKETCH2_R)
        with Locations(Location((2.394141003, -6.577848346, 0), (0, 0, 90))):
            Circle(SKETCH2_R)
        with Locations(Location((3.385999419, -9.302956946, 0), (0, 0, 90))):
            Circle(SKETCH2_R)
        with Locations(Location((0, -9.9, 0), (0, 0, 270))):
            Circle(SKETCH2_R)
        with Locations(Location((0, -7, 0), (0, 0, 270))):
            Circle(SKETCH2_R)
        with Locations(Location((-2.394141003, -6.577848346, 0), (0, 0, 270))):
            Circle(SKETCH2_R)
        with Locations(Location((-3.385999419, -9.302956946, 0), (0, 0, 270))):
            Circle(SKETCH2_R)
    extrude(amount=-CUT_EXTRUDE1_DEPTH, mode=Mode.SUBTRACT)


solid = part.part
